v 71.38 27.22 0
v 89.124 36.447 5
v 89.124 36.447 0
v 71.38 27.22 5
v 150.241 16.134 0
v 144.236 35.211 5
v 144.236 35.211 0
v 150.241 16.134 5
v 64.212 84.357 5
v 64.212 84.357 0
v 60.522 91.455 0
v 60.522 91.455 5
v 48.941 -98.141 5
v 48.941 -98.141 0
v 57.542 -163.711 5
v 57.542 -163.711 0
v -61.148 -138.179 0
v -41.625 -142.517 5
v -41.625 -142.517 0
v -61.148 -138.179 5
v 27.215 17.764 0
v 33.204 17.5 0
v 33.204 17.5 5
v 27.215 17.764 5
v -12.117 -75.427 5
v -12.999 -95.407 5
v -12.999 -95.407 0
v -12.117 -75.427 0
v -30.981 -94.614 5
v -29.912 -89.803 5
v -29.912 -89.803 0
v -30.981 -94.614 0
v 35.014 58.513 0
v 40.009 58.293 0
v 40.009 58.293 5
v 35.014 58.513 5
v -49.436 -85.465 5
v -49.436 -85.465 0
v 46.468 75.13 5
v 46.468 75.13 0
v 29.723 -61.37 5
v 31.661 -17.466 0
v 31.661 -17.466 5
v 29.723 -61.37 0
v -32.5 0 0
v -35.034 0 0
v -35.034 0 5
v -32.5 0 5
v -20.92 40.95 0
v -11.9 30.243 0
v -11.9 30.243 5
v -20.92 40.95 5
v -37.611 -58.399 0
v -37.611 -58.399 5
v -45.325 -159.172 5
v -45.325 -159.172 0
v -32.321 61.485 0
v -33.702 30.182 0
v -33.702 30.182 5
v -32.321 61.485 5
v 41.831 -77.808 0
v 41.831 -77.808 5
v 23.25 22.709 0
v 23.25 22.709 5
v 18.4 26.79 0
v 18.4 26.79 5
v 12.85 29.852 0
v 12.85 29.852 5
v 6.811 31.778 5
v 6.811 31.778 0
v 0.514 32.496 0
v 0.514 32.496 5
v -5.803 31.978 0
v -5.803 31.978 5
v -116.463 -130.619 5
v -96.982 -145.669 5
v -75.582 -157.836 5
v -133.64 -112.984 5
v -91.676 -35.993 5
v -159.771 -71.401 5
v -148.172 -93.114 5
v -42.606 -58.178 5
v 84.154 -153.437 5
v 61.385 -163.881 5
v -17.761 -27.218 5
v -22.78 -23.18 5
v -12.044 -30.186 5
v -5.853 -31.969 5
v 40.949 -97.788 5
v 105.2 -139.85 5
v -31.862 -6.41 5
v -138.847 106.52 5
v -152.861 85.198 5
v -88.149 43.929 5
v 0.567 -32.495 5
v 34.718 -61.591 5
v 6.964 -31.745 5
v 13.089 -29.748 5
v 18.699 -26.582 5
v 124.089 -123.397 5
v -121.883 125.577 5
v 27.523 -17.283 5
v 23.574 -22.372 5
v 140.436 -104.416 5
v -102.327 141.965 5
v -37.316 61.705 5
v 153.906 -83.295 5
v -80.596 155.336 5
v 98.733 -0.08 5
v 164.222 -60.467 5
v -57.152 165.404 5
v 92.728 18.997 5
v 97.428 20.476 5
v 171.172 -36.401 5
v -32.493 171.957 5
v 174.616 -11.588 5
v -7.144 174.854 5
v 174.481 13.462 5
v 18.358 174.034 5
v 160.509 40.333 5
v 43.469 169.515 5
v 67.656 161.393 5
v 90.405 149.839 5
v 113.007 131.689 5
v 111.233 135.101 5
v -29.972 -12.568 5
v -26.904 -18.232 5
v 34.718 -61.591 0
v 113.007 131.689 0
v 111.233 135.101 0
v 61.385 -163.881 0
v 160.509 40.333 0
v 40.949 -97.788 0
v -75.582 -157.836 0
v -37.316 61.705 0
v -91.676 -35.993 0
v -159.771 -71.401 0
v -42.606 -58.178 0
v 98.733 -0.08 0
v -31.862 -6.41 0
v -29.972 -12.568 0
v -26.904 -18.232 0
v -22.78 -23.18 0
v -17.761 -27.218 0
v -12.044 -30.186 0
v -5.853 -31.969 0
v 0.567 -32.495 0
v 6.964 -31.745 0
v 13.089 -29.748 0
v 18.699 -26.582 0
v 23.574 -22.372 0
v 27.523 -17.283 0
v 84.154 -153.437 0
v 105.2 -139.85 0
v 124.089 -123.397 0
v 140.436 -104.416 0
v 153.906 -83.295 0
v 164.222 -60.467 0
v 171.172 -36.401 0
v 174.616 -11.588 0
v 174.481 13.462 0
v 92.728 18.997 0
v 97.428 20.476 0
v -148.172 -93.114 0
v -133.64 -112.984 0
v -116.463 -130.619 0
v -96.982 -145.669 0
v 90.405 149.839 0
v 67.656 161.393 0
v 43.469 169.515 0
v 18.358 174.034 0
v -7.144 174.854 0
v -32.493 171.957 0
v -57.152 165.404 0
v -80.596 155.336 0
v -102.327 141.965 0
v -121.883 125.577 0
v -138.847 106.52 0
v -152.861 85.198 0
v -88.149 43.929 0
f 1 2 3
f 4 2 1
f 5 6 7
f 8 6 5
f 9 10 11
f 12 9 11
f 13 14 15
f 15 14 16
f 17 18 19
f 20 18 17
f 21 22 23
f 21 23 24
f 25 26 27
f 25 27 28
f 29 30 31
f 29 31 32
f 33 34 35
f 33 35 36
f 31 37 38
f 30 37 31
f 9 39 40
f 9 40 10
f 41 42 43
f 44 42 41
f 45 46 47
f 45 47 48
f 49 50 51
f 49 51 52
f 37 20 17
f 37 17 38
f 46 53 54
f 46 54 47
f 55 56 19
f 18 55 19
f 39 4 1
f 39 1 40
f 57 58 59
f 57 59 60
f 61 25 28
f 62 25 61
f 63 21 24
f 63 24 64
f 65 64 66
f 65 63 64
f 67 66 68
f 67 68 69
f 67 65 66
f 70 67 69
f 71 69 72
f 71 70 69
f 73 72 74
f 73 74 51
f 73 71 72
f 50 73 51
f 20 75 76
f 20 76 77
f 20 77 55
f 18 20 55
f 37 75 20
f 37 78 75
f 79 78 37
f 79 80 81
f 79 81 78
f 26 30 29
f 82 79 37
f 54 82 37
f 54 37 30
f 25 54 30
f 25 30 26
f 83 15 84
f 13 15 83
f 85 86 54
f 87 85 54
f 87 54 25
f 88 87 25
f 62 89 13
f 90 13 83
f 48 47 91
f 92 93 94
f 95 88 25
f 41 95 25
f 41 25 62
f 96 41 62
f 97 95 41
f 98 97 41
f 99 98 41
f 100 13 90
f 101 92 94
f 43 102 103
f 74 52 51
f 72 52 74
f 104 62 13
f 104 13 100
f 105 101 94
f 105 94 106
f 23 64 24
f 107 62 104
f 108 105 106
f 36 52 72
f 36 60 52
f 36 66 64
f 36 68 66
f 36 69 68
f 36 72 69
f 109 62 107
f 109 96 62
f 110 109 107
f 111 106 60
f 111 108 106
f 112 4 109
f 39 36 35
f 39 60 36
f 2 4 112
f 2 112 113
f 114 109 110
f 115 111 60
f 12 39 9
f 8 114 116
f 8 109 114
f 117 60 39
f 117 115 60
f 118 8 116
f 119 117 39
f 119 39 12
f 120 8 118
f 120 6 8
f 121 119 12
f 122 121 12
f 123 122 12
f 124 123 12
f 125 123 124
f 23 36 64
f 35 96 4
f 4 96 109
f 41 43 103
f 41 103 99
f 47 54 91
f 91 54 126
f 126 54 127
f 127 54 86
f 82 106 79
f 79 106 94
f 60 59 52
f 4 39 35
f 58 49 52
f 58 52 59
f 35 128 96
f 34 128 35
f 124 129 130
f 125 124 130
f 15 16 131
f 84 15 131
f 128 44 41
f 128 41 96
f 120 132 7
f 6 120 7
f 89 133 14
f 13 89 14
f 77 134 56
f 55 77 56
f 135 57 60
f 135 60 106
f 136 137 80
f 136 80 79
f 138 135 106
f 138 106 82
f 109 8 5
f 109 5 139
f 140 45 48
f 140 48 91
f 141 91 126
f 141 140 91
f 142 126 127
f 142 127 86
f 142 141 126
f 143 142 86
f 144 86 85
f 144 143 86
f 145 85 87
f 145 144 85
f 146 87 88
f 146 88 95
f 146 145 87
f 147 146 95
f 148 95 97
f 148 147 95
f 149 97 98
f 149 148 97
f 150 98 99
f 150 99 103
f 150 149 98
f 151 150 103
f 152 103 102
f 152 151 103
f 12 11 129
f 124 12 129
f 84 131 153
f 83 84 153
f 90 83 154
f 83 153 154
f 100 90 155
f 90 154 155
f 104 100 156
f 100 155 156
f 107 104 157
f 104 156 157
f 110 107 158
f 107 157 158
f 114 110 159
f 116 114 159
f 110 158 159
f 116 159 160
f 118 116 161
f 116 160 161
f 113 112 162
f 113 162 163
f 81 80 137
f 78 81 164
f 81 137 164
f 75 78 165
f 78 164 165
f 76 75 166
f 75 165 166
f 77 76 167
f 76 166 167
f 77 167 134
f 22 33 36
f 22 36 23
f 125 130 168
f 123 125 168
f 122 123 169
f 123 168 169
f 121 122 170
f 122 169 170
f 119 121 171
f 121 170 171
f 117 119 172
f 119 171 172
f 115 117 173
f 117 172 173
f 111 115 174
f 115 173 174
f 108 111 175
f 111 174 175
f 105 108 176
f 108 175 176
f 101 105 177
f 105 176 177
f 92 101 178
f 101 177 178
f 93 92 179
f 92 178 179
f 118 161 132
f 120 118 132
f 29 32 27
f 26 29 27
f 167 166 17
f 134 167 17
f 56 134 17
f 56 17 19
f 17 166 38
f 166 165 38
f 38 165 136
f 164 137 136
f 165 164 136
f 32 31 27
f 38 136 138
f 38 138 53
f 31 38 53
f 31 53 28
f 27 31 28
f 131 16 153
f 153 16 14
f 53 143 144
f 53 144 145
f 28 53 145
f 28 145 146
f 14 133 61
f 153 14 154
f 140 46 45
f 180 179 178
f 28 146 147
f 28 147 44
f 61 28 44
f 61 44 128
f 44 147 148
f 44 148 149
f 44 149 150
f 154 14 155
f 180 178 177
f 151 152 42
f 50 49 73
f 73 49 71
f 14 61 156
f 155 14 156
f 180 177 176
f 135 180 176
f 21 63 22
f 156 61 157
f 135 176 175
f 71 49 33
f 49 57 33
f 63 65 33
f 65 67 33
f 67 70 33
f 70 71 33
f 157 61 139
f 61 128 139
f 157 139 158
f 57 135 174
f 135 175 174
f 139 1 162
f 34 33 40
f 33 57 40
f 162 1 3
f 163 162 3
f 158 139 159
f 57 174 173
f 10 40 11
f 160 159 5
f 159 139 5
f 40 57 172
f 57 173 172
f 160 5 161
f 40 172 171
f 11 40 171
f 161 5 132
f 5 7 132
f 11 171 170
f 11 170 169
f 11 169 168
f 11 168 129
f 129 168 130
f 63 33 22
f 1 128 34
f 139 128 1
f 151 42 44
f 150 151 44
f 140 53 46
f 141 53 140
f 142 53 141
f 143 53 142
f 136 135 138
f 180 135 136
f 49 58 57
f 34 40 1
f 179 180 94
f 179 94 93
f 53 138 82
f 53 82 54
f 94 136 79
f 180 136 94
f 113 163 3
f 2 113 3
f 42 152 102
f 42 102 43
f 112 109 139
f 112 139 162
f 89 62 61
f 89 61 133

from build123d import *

# Parameters (mm, degrees)
ESQUISSE1_R             = 4.7
BOSS_EXTRU_1_DEPTH      = 5
ENL_V_START             = -10
ENL_V_MAT_EXTRU_1_DEPTH = 10
ENL_V_MAT_EXTRU_2_DEPTH = 10


with BuildPart() as part:
    # Esquisse1 → Boss.-Extru.1 (new body)
    with BuildSketch(Plane.XY):
        with BuildLine():
            Line((174.481446525, 13.461976776), (160.509166102, 40.333250621))
            Line((160.509166102, 40.333250621), (97.428399446, 20.476493551))
            Line((97.428399446, 20.476493551), (60.521806411, 91.454683092))
            Line((60.521806411, 91.454683092), (113.006926452, 131.688824037))
            Line((113.006926452, 131.688824037), (111.232668913, 135.101048724))
            ThreePointArc((111.232668913, 135.101048724), (-147.549372919, 94.096665994), (-75.582309389, -157.836353567))
            Line((-75.582309389, -157.836353567), (-45.324963396, -159.171640695))
            Line((-45.324963396, -159.171640695), (-30.981036128, -94.613715745))
            Line((-30.981036128, -94.613715745), (48.941175647, -98.140763381))
            Line((48.941175647, -98.140763381), (57.542403784, -163.71128113))
            Line((57.542403784, -163.71128113), (61.384605816, -163.880841372))
            ThreePointArc((61.384605816, -163.880841372), (147.549372919, -94.096665994), (174.481446525, 13.461976776))
        make_face()
        with Locations((121.484345953, 17.565156526)):
            Circle(ESQUISSE1_R, mode=Mode.SUBTRACT)
        with Locations((67.796167173, 55.788401035)):
            Circle(ESQUISSE1_R, mode=Mode.SUBTRACT)
        with Locations((14.416088947, -86.607403569)):
            Circle(ESQUISSE1_R, mode=Mode.SUBTRACT)
        with Locations((-45.530301203, -113.99110802)):
            Circle(ESQUISSE1_R, mode=Mode.SUBTRACT)
        with BuildLine():
            Line((-11.899961997, 30.243030676), (-20.91966999, 40.95026504))
            Line((-20.91966999, 40.95026504), (-33.702084088, 30.182438475))
            Line((-33.702084088, 30.182438475), (-32.320681925, 61.484742172))
            Line((-32.320681925, 61.484742172), (-37.315820161, 61.705182649))
            Line((-37.315820161, 61.705182649), (-42.606391614, -58.178135013))
            Line((-42.606391614, -58.178135013), (-37.611253378, -58.398575491))
            Line((-37.611253378, -58.398575491), (-35.034065472, 0))
            Line((-35.034065472, 0), (-32.5, 0))
            ThreePointArc((-32.5, 0), (-8.99280662, -31.231065129), (27.523349483, -17.283380261))
            Line((27.523349483, -17.283380261), (31.660744165, -17.465967651))
            Line((31.660744165, -17.465967651), (29.723210042, -61.370113123))
            Line((29.723210042, -61.370113123), (34.718348278, -61.590553601))
            Line((34.718348278, -61.590553601), (40.008919731, 58.292764062))
            Line((40.008919731, 58.292764062), (35.013781495, 58.513204539))
            Line((35.013781495, 58.513204539), (33.203827505, 17.5))
            Line((33.203827505, 17.5), (27.21544776, 17.764273225))
            ThreePointArc((27.21544776, 17.764273225), (9.877796967, 30.962543937), (-11.899961997, 30.243030676))
        make_face(mode=Mode.SUBTRACT)
    extrude(amount=BOSS_EXTRU_1_DEPTH)

    # Esquisse2 → Enlèv. mat.-Extru.1 (cut)
    with BuildSketch(Plane.XY.offset(5).offset(ENL_V_START)):
        with BuildLine():
            Line((-88.148964429, 43.929034477), (-152.860619324, 85.197600084))
            ThreePointArc((-152.860619324, 85.197600084), (-174.829838257, 7.715416702), (-159.771465705, -71.400831554))
            Line((-159.771465705, -71.400831554), (-91.676012064, -35.993177298))
            Line((-91.676012064, -35.993177298), (-88.148964429, 43.929034477))
        make_face()
    extrude(amount=ENL_V_MAT_EXTRU_1_DEPTH, mode=Mode.SUBTRACT)

    # Esquisse3 → Enlèv. mat.-Extru.2 (cut)
    with BuildSketch(Plane.XY.offset(5)):
        Polygon((40.948954466, -97.788058617), (-12.998538482, -95.407301464), (-12.116776573, -75.42674852), (41.830716375, -77.807505674), align=None)
        Polygon((-49.436008781, -85.46488415), (-29.912121681, -89.802836721), (-41.624593625, -142.517331891), (-61.148480724, -138.179379319), align=None)
        Polygon((64.212465714, 84.356864138), (89.124416013, 36.446586197), (71.379868627, 27.219937939), (46.467918329, 75.130215879), align=None)
        Polygon((98.732765194, -0.080397389), (92.727598771, 18.996761106), (144.235926707, 35.210710447), (150.24109313, 16.133551952), align=None)
    extrude(amount=-ENL_V_MAT_EXTRU_2_DEPTH, mode=Mode.SUBTRACT)


solid = part.part
